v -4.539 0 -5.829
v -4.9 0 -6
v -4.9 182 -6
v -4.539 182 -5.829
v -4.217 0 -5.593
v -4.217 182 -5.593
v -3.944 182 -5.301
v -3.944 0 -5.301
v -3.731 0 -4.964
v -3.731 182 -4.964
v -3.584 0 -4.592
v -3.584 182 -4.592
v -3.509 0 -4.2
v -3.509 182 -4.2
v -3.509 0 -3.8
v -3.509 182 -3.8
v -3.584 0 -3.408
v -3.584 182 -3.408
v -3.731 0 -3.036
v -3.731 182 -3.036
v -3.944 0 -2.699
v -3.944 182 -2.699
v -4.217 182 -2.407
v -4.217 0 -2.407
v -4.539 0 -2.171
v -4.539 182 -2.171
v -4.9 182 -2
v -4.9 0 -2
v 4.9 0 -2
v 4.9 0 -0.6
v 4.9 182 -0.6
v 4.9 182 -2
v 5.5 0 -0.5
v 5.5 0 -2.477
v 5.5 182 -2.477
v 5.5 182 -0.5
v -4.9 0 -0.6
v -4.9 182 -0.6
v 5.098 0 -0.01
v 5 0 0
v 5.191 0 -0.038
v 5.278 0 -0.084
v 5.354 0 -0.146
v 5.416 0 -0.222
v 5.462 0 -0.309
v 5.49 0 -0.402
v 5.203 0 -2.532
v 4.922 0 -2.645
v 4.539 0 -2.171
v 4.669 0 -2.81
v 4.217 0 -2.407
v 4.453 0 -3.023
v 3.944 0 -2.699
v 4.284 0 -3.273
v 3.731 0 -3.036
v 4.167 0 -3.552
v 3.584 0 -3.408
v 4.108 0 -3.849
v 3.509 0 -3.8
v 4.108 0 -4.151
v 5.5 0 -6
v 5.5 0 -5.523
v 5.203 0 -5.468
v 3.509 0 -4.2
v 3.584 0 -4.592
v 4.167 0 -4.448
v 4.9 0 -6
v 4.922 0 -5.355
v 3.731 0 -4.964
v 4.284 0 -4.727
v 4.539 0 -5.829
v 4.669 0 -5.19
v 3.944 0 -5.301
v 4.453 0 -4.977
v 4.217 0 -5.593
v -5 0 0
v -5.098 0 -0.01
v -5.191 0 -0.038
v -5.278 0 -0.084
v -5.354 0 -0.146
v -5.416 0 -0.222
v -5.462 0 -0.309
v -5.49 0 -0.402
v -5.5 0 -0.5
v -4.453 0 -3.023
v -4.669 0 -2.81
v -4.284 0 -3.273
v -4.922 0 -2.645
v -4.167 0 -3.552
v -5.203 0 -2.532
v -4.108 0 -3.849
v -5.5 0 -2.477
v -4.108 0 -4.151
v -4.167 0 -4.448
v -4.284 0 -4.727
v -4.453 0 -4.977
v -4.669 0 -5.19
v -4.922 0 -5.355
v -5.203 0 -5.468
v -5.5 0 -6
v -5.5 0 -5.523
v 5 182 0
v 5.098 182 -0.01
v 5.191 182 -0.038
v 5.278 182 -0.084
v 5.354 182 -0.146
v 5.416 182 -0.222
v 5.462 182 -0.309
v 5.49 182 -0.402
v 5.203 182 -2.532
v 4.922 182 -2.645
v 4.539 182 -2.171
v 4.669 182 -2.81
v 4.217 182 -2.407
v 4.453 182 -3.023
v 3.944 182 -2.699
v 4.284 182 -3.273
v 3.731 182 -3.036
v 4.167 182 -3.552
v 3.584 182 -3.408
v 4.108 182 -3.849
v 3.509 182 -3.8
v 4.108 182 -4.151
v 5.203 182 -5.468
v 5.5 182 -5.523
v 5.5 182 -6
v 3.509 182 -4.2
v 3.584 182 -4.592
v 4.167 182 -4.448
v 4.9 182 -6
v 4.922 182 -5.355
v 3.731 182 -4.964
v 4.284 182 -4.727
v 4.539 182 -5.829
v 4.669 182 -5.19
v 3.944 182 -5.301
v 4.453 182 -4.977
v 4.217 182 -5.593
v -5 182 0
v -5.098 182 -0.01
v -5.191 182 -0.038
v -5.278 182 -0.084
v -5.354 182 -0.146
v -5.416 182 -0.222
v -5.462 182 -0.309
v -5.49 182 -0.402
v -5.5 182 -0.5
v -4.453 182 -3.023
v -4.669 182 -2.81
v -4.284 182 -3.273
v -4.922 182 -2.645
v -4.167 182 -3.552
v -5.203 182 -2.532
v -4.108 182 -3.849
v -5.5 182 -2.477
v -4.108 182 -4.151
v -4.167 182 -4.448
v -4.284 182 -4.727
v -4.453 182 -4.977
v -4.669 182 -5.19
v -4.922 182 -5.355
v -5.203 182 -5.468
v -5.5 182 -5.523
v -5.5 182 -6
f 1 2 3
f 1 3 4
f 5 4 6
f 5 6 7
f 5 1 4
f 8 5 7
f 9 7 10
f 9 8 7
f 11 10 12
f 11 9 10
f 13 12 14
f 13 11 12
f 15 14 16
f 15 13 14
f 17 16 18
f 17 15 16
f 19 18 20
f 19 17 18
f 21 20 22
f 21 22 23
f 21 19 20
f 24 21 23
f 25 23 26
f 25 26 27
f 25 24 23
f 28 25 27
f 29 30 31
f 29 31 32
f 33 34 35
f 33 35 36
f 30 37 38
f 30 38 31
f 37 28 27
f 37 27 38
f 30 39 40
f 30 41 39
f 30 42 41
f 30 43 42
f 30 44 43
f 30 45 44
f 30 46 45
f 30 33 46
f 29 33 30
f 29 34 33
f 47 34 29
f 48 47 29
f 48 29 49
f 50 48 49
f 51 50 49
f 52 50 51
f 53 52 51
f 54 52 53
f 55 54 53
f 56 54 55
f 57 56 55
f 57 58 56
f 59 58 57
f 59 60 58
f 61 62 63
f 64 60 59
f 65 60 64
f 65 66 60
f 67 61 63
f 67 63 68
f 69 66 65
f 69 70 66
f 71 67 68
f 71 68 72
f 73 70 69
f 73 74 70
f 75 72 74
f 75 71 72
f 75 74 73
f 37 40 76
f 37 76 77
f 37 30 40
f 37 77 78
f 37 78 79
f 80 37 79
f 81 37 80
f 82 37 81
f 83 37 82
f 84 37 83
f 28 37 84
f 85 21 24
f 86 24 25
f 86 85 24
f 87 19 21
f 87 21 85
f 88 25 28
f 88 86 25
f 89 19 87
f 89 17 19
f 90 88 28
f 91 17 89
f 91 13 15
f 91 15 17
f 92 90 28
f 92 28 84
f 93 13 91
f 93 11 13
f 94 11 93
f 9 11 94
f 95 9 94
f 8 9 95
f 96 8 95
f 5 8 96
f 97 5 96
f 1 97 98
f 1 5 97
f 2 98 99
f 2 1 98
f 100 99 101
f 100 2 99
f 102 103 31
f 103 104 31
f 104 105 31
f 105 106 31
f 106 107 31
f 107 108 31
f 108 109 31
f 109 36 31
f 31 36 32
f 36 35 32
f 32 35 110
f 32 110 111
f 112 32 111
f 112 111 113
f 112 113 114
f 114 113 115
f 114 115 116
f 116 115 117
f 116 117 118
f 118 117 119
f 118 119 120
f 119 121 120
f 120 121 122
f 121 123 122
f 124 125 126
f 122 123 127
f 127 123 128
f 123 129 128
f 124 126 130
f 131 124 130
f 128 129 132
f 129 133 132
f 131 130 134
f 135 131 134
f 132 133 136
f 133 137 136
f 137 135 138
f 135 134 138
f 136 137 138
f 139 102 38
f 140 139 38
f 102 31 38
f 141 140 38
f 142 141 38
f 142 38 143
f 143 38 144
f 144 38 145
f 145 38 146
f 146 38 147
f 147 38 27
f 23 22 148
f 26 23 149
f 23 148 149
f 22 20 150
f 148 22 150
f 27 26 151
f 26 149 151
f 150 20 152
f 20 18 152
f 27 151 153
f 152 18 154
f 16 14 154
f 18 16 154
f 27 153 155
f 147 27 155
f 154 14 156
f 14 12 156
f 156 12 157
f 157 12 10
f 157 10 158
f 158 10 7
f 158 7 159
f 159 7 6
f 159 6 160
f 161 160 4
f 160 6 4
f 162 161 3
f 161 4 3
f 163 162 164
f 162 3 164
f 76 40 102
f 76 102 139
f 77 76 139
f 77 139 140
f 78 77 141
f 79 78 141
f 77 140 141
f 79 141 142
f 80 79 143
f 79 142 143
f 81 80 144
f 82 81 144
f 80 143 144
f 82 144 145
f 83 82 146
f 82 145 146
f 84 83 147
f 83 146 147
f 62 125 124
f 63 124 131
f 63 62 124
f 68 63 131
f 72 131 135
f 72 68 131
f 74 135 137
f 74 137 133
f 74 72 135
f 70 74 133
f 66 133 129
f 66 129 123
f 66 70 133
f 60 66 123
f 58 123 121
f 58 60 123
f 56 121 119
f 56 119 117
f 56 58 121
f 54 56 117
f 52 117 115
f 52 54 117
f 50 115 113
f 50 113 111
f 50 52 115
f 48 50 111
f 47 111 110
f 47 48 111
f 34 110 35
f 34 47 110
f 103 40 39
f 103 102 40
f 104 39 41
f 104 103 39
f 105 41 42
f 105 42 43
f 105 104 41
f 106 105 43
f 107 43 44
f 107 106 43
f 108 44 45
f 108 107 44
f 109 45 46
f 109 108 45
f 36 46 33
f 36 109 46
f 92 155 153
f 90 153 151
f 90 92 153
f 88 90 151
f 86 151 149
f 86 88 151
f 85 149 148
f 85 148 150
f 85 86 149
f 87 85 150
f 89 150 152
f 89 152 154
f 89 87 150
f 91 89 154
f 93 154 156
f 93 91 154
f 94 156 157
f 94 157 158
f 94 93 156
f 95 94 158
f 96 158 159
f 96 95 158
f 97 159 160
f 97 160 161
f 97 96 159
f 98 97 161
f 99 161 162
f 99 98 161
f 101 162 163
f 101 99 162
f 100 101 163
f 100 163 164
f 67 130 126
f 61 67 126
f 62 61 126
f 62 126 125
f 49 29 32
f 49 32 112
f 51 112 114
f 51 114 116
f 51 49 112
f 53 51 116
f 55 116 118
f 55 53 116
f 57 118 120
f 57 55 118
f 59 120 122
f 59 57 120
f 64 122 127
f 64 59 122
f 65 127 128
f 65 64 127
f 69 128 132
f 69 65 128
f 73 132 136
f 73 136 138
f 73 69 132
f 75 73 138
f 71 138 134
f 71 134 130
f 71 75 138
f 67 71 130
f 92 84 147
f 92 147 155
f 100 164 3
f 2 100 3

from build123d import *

# Parameters (mm, degrees)
EXTRUSION1_DEPTH = 182
CONG_1_R         = 0.5


with BuildPart() as part:
    # Esquisse1 → Extrusion1 (new body)
    with BuildSketch(Plane(origin=(0, 0, 0), x_dir=(1, 0, 0), z_dir=(0, 1, 0))):
        with BuildLine():
            Line((5.5, 0), (-5.5, 0))
            Line((-5.5, 0), (-5.5, 2.476845379))
            ThreePointArc((-5.5, 2.476845379), (-4.1, 4), (-5.5, 5.523154621))
            Line((-5.5, 5.523154621), (-5.5, 6))
            Line((-5.5, 6), (-4.9, 6))
            ThreePointArc((-4.9, 6), (-3.5, 4), (-4.9, 2))
            Line((-4.9, 2), (-4.9, 0.6))
            Line((-4.9, 0.6), (4.9, 0.6))
            Line((4.9, 0.6), (4.9, 2))
            ThreePointArc((4.9, 2), (3.5, 4), (4.9, 6))
            Line((4.9, 6), (5.5, 6))
            Line((5.5, 6), (5.5, 5.523154621))
            ThreePointArc((5.5, 5.523154621), (4.1, 4), (5.5, 2.476845379))
            Line((5.5, 2.476845379), (5.5, 0))
        make_face()
    extrude(amount=EXTRUSION1_DEPTH)

    # Congé1
    cong_1_edges = [part.edges().sort_by_distance(p)[0] for p in [
        (5.5, 91, 0),
        (-5.5, 91, 0),
    ]]
    fillet(cong_1_edges, radius=CONG_1_R)


solid = part.part
